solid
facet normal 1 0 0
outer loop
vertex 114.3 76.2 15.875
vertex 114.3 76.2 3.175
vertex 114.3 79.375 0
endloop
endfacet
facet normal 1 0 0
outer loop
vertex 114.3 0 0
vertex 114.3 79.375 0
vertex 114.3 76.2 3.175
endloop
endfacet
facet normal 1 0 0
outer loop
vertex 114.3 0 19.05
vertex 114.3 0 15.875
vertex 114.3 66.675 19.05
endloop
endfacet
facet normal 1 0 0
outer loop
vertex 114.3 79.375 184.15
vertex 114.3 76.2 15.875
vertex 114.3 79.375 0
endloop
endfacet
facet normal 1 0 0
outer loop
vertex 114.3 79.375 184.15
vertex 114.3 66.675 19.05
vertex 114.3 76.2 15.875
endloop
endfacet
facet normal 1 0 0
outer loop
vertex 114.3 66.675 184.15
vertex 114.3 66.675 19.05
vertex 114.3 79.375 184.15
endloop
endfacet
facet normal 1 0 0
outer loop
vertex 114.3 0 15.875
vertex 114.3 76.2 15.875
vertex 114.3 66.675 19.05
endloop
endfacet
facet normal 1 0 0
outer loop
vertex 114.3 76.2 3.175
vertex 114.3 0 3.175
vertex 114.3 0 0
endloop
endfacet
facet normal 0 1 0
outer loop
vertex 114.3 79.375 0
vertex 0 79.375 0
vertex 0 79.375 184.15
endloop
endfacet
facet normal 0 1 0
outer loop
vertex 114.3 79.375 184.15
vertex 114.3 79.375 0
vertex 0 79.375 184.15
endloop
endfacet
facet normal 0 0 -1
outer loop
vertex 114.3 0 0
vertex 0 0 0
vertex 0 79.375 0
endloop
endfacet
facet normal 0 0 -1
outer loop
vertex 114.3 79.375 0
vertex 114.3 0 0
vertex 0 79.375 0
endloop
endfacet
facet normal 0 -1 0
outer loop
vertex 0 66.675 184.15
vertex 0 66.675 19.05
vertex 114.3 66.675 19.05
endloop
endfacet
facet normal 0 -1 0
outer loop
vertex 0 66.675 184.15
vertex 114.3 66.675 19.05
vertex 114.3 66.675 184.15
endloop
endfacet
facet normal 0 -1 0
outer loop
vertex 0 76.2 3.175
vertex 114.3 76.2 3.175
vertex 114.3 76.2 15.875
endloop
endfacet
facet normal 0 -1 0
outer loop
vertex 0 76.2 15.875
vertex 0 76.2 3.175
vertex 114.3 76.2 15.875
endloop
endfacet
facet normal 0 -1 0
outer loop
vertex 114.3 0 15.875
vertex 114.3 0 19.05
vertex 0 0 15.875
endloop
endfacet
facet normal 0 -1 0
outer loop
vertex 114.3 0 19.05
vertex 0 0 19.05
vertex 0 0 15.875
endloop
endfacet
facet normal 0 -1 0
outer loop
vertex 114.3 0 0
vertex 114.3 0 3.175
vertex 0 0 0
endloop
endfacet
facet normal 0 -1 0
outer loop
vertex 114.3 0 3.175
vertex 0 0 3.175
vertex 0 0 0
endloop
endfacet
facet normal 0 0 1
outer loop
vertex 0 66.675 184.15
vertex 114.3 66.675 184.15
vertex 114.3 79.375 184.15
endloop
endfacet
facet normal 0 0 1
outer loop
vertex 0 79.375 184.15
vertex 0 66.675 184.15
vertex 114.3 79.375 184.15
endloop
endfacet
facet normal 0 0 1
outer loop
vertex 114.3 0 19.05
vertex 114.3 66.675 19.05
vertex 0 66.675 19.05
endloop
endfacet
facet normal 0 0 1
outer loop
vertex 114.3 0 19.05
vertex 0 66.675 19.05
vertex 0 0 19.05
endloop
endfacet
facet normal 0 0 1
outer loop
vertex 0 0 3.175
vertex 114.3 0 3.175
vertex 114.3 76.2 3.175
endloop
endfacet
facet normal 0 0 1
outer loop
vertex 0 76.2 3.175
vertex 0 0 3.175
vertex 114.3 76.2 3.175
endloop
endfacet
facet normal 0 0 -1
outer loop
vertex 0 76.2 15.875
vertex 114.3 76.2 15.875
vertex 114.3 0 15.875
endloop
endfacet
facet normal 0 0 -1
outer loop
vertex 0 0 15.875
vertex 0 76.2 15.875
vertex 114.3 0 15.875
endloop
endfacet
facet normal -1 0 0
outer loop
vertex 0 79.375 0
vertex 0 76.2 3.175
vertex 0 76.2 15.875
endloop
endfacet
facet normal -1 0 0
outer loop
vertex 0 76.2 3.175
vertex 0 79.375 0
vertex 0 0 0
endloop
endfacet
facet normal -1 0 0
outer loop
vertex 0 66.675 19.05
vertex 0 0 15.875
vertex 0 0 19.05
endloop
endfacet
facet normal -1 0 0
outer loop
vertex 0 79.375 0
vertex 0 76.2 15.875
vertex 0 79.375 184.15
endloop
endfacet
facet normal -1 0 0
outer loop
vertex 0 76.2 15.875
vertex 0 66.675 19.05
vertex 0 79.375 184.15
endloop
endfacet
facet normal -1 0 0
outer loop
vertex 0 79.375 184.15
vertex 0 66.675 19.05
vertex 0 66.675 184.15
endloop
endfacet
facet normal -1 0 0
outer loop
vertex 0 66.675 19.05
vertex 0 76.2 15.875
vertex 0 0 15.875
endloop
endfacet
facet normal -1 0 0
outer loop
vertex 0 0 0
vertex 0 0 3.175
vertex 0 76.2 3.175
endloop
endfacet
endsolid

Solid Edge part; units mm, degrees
sketch "Sketch1" plane through (0, 0, 0) normal (1, 0, 0) x (0, 1, 0)
  line L0 (79.375, 19.05) -> (0, 19.05)
  line L1 (0, 19.05) -> (0, 0)
  line L2 (0, 0) -> (79.375, 0)
  line L3 (79.375, 0) -> (79.375, 19.05)
extrude "Protrusion1" add sketch "Sketch1" along normal blind 114.3
shell "Thinwall_1" thickness 3.175 removed faces 3 at (114.3, 65.3521, 2.9845) at (94.107, 0, 16.0655) at (0, 65.3521, 2.9845)
sketch "Sketch2" plane through (0, 0, 0) normal (1, 0, 0) x (0, 1, 0)
  line L0 (79.375, 184.15) -> (79.375, 19.05)
  line L1 (79.375, 19.05) -> (66.675, 19.05)
  line L2 (66.675, 19.05) -> (66.675, 184.15)
  line L3 (66.675, 184.15) -> (79.375, 184.15)
extrude "Protrusion2" add sketch "Sketch2" along normal up to vertex (114.3 mm away)
properties material "ABS Plastic, medium impact"
